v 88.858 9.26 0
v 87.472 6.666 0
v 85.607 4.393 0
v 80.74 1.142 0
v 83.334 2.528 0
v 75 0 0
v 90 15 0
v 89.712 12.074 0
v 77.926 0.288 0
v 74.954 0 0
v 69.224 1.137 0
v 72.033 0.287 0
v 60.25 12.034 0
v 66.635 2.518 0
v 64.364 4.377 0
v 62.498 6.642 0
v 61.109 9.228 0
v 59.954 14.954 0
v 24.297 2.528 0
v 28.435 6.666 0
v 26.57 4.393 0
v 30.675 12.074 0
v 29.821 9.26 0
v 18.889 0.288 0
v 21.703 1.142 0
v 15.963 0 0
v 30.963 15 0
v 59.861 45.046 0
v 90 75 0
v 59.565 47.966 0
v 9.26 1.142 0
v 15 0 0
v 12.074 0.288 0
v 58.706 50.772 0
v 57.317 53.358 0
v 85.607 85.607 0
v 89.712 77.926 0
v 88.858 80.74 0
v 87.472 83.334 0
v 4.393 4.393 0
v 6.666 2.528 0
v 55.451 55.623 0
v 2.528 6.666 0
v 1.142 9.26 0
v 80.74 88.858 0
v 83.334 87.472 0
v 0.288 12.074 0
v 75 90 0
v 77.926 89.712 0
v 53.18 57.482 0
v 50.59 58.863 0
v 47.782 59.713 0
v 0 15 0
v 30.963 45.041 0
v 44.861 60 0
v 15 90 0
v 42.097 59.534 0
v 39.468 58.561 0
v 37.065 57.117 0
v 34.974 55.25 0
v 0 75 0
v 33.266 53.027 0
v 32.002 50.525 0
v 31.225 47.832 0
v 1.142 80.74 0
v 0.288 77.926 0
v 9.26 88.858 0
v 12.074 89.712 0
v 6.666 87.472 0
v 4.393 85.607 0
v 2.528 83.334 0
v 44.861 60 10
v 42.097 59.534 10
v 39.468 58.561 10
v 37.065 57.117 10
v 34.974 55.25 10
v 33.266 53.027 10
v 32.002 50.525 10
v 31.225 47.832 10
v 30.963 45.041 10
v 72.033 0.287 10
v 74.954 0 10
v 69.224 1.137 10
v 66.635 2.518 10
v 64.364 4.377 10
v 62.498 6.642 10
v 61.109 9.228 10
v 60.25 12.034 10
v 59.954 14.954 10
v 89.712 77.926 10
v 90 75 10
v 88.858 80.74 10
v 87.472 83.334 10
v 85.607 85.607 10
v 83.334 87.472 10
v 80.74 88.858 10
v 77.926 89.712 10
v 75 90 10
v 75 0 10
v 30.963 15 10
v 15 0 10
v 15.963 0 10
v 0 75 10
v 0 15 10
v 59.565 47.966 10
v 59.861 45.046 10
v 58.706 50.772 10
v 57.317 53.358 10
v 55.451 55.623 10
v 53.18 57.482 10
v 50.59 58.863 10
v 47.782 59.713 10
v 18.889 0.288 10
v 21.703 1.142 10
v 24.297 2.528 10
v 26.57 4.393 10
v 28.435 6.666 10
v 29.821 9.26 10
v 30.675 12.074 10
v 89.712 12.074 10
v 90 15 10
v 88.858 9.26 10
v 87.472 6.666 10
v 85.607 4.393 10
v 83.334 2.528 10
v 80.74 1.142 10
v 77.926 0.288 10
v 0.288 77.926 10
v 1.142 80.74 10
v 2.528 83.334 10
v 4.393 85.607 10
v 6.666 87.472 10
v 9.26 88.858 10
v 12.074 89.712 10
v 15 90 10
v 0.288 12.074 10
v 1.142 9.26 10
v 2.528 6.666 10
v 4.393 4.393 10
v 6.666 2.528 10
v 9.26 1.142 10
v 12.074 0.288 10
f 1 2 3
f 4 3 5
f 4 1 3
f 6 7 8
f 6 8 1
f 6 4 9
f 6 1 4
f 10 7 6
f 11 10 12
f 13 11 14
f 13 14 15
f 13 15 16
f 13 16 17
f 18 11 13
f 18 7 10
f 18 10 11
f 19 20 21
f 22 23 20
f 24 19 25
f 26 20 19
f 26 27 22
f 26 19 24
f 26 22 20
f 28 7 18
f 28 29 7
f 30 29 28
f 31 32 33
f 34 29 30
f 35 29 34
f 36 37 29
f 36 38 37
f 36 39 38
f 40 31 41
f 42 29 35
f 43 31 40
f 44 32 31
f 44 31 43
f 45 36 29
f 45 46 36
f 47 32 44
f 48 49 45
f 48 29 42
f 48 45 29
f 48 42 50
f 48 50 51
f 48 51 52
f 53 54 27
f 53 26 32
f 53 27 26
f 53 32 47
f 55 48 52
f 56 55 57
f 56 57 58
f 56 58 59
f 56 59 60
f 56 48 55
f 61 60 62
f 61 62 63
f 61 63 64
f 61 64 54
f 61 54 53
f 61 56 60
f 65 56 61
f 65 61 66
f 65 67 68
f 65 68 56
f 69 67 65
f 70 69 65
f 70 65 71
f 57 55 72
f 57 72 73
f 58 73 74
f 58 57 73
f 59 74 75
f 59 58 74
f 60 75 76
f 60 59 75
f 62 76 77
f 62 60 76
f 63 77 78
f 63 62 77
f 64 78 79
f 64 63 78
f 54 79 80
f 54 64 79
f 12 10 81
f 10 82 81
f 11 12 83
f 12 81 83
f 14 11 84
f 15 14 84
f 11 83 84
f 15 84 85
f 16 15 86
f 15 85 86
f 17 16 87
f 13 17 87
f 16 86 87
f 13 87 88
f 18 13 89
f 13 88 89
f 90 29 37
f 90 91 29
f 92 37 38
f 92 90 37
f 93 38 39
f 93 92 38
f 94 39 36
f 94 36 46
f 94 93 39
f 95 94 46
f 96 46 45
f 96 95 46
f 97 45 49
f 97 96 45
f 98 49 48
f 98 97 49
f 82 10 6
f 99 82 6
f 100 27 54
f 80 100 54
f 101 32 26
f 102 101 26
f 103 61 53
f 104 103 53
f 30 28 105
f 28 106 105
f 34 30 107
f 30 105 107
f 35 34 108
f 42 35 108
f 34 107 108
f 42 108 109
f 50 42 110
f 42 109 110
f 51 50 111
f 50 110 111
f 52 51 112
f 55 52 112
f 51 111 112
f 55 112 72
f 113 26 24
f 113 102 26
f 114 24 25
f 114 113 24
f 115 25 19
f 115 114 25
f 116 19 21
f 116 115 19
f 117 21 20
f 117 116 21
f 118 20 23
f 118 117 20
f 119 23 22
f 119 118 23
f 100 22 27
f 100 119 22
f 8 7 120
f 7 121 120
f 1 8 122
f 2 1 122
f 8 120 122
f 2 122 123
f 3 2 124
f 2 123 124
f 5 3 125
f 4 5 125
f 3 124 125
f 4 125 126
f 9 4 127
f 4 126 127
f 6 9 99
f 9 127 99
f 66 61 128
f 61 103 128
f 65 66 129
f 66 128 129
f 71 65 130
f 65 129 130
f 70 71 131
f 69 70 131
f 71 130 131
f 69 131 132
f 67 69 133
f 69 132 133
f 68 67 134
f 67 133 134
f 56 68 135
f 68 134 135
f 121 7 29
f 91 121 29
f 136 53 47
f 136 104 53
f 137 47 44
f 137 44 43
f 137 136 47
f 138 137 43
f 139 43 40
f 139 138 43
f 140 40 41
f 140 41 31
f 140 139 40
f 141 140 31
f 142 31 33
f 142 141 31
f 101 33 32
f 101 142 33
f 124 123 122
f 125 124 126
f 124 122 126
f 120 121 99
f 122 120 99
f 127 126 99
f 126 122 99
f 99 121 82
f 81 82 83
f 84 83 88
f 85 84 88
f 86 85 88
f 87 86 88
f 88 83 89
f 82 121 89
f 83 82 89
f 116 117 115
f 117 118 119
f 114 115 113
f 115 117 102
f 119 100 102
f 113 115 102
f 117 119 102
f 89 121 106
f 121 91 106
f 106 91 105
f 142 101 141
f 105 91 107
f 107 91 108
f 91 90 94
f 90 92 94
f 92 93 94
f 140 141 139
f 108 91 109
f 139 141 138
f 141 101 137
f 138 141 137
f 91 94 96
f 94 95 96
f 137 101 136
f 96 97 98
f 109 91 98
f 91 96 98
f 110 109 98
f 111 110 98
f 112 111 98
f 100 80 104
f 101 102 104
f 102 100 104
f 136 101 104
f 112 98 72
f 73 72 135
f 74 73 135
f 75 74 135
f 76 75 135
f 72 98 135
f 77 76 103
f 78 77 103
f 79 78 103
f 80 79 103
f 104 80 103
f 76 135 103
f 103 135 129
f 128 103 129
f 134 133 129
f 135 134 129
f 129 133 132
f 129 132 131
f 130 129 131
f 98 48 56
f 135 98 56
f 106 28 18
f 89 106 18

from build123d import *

# Parameters (mm, degrees)
F1_DEPTH    = 10
F2_R        = 15
F3_R        = 15
F4_R        = 15
F5_R        = 15
F6_T1_DEPTH = 10


# Not quite as in the source:
# - a fillet or chamfer that OpenCascade refuses, or shapes differently, is made with other operations: its cross-section is extruded or revolved along the edge and cut away or added


with BuildPart() as f1:
    # F0 (on Top) → F1 (new body)
    with BuildSketch(Plane.XY):
        Polygon((0, 90), (0, 0), (30.9630036354, 0), (30.9630036354, 60), (59.8146165162, 60), (60, 0), (90, 0), (90, 90), align=None)
    extrude(amount=F1_DEPTH)

    # F2
    f2_edges = [f1.edges().sort_by_distance(p)[0] for p in [
        (0, 90, 5),
        (90, 90, 5),
    ]]
    fillet(f2_edges, radius=F2_R)

    # F3
    f3_edges = [f1.edges().sort_by_distance(p)[0] for p in [
        (0, 0, 5),
        (30.963004, 0, 5),
    ]]
    fillet(f3_edges, radius=F3_R)

    # F4
    f4_edges = [f1.edges().sort_by_distance(p)[0] for p in [
        (60, 0, 5),
        (90, 0, 5),
    ]]
    fillet(f4_edges, radius=F4_R)

    # F5
    f5_edges = [f1.edges().sort_by_distance(p)[0] for p in [
        (59.814617, 60, 5),
    ]]
    fillet(f5_edges, radius=F5_R)

    # F6: fillet of radius 15 on 1 edges, made by hand

    # F6_s2 → F6_t1 (join)
    with BuildSketch(Plane.XY):
        with BuildLine():
            ThreePointArc((44.8608907894, 60), (34.9736521375, 55.2500561159), (30.9630036354, 45.0405432159))
            Line((30.9630036354, 45.0405432159), (30.9630036354, 60))
            Line((30.9630036354, 60), (44.8608907894, 60))
        make_face()
    extrude(amount=F6_T1_DEPTH)


solid = f1.part
